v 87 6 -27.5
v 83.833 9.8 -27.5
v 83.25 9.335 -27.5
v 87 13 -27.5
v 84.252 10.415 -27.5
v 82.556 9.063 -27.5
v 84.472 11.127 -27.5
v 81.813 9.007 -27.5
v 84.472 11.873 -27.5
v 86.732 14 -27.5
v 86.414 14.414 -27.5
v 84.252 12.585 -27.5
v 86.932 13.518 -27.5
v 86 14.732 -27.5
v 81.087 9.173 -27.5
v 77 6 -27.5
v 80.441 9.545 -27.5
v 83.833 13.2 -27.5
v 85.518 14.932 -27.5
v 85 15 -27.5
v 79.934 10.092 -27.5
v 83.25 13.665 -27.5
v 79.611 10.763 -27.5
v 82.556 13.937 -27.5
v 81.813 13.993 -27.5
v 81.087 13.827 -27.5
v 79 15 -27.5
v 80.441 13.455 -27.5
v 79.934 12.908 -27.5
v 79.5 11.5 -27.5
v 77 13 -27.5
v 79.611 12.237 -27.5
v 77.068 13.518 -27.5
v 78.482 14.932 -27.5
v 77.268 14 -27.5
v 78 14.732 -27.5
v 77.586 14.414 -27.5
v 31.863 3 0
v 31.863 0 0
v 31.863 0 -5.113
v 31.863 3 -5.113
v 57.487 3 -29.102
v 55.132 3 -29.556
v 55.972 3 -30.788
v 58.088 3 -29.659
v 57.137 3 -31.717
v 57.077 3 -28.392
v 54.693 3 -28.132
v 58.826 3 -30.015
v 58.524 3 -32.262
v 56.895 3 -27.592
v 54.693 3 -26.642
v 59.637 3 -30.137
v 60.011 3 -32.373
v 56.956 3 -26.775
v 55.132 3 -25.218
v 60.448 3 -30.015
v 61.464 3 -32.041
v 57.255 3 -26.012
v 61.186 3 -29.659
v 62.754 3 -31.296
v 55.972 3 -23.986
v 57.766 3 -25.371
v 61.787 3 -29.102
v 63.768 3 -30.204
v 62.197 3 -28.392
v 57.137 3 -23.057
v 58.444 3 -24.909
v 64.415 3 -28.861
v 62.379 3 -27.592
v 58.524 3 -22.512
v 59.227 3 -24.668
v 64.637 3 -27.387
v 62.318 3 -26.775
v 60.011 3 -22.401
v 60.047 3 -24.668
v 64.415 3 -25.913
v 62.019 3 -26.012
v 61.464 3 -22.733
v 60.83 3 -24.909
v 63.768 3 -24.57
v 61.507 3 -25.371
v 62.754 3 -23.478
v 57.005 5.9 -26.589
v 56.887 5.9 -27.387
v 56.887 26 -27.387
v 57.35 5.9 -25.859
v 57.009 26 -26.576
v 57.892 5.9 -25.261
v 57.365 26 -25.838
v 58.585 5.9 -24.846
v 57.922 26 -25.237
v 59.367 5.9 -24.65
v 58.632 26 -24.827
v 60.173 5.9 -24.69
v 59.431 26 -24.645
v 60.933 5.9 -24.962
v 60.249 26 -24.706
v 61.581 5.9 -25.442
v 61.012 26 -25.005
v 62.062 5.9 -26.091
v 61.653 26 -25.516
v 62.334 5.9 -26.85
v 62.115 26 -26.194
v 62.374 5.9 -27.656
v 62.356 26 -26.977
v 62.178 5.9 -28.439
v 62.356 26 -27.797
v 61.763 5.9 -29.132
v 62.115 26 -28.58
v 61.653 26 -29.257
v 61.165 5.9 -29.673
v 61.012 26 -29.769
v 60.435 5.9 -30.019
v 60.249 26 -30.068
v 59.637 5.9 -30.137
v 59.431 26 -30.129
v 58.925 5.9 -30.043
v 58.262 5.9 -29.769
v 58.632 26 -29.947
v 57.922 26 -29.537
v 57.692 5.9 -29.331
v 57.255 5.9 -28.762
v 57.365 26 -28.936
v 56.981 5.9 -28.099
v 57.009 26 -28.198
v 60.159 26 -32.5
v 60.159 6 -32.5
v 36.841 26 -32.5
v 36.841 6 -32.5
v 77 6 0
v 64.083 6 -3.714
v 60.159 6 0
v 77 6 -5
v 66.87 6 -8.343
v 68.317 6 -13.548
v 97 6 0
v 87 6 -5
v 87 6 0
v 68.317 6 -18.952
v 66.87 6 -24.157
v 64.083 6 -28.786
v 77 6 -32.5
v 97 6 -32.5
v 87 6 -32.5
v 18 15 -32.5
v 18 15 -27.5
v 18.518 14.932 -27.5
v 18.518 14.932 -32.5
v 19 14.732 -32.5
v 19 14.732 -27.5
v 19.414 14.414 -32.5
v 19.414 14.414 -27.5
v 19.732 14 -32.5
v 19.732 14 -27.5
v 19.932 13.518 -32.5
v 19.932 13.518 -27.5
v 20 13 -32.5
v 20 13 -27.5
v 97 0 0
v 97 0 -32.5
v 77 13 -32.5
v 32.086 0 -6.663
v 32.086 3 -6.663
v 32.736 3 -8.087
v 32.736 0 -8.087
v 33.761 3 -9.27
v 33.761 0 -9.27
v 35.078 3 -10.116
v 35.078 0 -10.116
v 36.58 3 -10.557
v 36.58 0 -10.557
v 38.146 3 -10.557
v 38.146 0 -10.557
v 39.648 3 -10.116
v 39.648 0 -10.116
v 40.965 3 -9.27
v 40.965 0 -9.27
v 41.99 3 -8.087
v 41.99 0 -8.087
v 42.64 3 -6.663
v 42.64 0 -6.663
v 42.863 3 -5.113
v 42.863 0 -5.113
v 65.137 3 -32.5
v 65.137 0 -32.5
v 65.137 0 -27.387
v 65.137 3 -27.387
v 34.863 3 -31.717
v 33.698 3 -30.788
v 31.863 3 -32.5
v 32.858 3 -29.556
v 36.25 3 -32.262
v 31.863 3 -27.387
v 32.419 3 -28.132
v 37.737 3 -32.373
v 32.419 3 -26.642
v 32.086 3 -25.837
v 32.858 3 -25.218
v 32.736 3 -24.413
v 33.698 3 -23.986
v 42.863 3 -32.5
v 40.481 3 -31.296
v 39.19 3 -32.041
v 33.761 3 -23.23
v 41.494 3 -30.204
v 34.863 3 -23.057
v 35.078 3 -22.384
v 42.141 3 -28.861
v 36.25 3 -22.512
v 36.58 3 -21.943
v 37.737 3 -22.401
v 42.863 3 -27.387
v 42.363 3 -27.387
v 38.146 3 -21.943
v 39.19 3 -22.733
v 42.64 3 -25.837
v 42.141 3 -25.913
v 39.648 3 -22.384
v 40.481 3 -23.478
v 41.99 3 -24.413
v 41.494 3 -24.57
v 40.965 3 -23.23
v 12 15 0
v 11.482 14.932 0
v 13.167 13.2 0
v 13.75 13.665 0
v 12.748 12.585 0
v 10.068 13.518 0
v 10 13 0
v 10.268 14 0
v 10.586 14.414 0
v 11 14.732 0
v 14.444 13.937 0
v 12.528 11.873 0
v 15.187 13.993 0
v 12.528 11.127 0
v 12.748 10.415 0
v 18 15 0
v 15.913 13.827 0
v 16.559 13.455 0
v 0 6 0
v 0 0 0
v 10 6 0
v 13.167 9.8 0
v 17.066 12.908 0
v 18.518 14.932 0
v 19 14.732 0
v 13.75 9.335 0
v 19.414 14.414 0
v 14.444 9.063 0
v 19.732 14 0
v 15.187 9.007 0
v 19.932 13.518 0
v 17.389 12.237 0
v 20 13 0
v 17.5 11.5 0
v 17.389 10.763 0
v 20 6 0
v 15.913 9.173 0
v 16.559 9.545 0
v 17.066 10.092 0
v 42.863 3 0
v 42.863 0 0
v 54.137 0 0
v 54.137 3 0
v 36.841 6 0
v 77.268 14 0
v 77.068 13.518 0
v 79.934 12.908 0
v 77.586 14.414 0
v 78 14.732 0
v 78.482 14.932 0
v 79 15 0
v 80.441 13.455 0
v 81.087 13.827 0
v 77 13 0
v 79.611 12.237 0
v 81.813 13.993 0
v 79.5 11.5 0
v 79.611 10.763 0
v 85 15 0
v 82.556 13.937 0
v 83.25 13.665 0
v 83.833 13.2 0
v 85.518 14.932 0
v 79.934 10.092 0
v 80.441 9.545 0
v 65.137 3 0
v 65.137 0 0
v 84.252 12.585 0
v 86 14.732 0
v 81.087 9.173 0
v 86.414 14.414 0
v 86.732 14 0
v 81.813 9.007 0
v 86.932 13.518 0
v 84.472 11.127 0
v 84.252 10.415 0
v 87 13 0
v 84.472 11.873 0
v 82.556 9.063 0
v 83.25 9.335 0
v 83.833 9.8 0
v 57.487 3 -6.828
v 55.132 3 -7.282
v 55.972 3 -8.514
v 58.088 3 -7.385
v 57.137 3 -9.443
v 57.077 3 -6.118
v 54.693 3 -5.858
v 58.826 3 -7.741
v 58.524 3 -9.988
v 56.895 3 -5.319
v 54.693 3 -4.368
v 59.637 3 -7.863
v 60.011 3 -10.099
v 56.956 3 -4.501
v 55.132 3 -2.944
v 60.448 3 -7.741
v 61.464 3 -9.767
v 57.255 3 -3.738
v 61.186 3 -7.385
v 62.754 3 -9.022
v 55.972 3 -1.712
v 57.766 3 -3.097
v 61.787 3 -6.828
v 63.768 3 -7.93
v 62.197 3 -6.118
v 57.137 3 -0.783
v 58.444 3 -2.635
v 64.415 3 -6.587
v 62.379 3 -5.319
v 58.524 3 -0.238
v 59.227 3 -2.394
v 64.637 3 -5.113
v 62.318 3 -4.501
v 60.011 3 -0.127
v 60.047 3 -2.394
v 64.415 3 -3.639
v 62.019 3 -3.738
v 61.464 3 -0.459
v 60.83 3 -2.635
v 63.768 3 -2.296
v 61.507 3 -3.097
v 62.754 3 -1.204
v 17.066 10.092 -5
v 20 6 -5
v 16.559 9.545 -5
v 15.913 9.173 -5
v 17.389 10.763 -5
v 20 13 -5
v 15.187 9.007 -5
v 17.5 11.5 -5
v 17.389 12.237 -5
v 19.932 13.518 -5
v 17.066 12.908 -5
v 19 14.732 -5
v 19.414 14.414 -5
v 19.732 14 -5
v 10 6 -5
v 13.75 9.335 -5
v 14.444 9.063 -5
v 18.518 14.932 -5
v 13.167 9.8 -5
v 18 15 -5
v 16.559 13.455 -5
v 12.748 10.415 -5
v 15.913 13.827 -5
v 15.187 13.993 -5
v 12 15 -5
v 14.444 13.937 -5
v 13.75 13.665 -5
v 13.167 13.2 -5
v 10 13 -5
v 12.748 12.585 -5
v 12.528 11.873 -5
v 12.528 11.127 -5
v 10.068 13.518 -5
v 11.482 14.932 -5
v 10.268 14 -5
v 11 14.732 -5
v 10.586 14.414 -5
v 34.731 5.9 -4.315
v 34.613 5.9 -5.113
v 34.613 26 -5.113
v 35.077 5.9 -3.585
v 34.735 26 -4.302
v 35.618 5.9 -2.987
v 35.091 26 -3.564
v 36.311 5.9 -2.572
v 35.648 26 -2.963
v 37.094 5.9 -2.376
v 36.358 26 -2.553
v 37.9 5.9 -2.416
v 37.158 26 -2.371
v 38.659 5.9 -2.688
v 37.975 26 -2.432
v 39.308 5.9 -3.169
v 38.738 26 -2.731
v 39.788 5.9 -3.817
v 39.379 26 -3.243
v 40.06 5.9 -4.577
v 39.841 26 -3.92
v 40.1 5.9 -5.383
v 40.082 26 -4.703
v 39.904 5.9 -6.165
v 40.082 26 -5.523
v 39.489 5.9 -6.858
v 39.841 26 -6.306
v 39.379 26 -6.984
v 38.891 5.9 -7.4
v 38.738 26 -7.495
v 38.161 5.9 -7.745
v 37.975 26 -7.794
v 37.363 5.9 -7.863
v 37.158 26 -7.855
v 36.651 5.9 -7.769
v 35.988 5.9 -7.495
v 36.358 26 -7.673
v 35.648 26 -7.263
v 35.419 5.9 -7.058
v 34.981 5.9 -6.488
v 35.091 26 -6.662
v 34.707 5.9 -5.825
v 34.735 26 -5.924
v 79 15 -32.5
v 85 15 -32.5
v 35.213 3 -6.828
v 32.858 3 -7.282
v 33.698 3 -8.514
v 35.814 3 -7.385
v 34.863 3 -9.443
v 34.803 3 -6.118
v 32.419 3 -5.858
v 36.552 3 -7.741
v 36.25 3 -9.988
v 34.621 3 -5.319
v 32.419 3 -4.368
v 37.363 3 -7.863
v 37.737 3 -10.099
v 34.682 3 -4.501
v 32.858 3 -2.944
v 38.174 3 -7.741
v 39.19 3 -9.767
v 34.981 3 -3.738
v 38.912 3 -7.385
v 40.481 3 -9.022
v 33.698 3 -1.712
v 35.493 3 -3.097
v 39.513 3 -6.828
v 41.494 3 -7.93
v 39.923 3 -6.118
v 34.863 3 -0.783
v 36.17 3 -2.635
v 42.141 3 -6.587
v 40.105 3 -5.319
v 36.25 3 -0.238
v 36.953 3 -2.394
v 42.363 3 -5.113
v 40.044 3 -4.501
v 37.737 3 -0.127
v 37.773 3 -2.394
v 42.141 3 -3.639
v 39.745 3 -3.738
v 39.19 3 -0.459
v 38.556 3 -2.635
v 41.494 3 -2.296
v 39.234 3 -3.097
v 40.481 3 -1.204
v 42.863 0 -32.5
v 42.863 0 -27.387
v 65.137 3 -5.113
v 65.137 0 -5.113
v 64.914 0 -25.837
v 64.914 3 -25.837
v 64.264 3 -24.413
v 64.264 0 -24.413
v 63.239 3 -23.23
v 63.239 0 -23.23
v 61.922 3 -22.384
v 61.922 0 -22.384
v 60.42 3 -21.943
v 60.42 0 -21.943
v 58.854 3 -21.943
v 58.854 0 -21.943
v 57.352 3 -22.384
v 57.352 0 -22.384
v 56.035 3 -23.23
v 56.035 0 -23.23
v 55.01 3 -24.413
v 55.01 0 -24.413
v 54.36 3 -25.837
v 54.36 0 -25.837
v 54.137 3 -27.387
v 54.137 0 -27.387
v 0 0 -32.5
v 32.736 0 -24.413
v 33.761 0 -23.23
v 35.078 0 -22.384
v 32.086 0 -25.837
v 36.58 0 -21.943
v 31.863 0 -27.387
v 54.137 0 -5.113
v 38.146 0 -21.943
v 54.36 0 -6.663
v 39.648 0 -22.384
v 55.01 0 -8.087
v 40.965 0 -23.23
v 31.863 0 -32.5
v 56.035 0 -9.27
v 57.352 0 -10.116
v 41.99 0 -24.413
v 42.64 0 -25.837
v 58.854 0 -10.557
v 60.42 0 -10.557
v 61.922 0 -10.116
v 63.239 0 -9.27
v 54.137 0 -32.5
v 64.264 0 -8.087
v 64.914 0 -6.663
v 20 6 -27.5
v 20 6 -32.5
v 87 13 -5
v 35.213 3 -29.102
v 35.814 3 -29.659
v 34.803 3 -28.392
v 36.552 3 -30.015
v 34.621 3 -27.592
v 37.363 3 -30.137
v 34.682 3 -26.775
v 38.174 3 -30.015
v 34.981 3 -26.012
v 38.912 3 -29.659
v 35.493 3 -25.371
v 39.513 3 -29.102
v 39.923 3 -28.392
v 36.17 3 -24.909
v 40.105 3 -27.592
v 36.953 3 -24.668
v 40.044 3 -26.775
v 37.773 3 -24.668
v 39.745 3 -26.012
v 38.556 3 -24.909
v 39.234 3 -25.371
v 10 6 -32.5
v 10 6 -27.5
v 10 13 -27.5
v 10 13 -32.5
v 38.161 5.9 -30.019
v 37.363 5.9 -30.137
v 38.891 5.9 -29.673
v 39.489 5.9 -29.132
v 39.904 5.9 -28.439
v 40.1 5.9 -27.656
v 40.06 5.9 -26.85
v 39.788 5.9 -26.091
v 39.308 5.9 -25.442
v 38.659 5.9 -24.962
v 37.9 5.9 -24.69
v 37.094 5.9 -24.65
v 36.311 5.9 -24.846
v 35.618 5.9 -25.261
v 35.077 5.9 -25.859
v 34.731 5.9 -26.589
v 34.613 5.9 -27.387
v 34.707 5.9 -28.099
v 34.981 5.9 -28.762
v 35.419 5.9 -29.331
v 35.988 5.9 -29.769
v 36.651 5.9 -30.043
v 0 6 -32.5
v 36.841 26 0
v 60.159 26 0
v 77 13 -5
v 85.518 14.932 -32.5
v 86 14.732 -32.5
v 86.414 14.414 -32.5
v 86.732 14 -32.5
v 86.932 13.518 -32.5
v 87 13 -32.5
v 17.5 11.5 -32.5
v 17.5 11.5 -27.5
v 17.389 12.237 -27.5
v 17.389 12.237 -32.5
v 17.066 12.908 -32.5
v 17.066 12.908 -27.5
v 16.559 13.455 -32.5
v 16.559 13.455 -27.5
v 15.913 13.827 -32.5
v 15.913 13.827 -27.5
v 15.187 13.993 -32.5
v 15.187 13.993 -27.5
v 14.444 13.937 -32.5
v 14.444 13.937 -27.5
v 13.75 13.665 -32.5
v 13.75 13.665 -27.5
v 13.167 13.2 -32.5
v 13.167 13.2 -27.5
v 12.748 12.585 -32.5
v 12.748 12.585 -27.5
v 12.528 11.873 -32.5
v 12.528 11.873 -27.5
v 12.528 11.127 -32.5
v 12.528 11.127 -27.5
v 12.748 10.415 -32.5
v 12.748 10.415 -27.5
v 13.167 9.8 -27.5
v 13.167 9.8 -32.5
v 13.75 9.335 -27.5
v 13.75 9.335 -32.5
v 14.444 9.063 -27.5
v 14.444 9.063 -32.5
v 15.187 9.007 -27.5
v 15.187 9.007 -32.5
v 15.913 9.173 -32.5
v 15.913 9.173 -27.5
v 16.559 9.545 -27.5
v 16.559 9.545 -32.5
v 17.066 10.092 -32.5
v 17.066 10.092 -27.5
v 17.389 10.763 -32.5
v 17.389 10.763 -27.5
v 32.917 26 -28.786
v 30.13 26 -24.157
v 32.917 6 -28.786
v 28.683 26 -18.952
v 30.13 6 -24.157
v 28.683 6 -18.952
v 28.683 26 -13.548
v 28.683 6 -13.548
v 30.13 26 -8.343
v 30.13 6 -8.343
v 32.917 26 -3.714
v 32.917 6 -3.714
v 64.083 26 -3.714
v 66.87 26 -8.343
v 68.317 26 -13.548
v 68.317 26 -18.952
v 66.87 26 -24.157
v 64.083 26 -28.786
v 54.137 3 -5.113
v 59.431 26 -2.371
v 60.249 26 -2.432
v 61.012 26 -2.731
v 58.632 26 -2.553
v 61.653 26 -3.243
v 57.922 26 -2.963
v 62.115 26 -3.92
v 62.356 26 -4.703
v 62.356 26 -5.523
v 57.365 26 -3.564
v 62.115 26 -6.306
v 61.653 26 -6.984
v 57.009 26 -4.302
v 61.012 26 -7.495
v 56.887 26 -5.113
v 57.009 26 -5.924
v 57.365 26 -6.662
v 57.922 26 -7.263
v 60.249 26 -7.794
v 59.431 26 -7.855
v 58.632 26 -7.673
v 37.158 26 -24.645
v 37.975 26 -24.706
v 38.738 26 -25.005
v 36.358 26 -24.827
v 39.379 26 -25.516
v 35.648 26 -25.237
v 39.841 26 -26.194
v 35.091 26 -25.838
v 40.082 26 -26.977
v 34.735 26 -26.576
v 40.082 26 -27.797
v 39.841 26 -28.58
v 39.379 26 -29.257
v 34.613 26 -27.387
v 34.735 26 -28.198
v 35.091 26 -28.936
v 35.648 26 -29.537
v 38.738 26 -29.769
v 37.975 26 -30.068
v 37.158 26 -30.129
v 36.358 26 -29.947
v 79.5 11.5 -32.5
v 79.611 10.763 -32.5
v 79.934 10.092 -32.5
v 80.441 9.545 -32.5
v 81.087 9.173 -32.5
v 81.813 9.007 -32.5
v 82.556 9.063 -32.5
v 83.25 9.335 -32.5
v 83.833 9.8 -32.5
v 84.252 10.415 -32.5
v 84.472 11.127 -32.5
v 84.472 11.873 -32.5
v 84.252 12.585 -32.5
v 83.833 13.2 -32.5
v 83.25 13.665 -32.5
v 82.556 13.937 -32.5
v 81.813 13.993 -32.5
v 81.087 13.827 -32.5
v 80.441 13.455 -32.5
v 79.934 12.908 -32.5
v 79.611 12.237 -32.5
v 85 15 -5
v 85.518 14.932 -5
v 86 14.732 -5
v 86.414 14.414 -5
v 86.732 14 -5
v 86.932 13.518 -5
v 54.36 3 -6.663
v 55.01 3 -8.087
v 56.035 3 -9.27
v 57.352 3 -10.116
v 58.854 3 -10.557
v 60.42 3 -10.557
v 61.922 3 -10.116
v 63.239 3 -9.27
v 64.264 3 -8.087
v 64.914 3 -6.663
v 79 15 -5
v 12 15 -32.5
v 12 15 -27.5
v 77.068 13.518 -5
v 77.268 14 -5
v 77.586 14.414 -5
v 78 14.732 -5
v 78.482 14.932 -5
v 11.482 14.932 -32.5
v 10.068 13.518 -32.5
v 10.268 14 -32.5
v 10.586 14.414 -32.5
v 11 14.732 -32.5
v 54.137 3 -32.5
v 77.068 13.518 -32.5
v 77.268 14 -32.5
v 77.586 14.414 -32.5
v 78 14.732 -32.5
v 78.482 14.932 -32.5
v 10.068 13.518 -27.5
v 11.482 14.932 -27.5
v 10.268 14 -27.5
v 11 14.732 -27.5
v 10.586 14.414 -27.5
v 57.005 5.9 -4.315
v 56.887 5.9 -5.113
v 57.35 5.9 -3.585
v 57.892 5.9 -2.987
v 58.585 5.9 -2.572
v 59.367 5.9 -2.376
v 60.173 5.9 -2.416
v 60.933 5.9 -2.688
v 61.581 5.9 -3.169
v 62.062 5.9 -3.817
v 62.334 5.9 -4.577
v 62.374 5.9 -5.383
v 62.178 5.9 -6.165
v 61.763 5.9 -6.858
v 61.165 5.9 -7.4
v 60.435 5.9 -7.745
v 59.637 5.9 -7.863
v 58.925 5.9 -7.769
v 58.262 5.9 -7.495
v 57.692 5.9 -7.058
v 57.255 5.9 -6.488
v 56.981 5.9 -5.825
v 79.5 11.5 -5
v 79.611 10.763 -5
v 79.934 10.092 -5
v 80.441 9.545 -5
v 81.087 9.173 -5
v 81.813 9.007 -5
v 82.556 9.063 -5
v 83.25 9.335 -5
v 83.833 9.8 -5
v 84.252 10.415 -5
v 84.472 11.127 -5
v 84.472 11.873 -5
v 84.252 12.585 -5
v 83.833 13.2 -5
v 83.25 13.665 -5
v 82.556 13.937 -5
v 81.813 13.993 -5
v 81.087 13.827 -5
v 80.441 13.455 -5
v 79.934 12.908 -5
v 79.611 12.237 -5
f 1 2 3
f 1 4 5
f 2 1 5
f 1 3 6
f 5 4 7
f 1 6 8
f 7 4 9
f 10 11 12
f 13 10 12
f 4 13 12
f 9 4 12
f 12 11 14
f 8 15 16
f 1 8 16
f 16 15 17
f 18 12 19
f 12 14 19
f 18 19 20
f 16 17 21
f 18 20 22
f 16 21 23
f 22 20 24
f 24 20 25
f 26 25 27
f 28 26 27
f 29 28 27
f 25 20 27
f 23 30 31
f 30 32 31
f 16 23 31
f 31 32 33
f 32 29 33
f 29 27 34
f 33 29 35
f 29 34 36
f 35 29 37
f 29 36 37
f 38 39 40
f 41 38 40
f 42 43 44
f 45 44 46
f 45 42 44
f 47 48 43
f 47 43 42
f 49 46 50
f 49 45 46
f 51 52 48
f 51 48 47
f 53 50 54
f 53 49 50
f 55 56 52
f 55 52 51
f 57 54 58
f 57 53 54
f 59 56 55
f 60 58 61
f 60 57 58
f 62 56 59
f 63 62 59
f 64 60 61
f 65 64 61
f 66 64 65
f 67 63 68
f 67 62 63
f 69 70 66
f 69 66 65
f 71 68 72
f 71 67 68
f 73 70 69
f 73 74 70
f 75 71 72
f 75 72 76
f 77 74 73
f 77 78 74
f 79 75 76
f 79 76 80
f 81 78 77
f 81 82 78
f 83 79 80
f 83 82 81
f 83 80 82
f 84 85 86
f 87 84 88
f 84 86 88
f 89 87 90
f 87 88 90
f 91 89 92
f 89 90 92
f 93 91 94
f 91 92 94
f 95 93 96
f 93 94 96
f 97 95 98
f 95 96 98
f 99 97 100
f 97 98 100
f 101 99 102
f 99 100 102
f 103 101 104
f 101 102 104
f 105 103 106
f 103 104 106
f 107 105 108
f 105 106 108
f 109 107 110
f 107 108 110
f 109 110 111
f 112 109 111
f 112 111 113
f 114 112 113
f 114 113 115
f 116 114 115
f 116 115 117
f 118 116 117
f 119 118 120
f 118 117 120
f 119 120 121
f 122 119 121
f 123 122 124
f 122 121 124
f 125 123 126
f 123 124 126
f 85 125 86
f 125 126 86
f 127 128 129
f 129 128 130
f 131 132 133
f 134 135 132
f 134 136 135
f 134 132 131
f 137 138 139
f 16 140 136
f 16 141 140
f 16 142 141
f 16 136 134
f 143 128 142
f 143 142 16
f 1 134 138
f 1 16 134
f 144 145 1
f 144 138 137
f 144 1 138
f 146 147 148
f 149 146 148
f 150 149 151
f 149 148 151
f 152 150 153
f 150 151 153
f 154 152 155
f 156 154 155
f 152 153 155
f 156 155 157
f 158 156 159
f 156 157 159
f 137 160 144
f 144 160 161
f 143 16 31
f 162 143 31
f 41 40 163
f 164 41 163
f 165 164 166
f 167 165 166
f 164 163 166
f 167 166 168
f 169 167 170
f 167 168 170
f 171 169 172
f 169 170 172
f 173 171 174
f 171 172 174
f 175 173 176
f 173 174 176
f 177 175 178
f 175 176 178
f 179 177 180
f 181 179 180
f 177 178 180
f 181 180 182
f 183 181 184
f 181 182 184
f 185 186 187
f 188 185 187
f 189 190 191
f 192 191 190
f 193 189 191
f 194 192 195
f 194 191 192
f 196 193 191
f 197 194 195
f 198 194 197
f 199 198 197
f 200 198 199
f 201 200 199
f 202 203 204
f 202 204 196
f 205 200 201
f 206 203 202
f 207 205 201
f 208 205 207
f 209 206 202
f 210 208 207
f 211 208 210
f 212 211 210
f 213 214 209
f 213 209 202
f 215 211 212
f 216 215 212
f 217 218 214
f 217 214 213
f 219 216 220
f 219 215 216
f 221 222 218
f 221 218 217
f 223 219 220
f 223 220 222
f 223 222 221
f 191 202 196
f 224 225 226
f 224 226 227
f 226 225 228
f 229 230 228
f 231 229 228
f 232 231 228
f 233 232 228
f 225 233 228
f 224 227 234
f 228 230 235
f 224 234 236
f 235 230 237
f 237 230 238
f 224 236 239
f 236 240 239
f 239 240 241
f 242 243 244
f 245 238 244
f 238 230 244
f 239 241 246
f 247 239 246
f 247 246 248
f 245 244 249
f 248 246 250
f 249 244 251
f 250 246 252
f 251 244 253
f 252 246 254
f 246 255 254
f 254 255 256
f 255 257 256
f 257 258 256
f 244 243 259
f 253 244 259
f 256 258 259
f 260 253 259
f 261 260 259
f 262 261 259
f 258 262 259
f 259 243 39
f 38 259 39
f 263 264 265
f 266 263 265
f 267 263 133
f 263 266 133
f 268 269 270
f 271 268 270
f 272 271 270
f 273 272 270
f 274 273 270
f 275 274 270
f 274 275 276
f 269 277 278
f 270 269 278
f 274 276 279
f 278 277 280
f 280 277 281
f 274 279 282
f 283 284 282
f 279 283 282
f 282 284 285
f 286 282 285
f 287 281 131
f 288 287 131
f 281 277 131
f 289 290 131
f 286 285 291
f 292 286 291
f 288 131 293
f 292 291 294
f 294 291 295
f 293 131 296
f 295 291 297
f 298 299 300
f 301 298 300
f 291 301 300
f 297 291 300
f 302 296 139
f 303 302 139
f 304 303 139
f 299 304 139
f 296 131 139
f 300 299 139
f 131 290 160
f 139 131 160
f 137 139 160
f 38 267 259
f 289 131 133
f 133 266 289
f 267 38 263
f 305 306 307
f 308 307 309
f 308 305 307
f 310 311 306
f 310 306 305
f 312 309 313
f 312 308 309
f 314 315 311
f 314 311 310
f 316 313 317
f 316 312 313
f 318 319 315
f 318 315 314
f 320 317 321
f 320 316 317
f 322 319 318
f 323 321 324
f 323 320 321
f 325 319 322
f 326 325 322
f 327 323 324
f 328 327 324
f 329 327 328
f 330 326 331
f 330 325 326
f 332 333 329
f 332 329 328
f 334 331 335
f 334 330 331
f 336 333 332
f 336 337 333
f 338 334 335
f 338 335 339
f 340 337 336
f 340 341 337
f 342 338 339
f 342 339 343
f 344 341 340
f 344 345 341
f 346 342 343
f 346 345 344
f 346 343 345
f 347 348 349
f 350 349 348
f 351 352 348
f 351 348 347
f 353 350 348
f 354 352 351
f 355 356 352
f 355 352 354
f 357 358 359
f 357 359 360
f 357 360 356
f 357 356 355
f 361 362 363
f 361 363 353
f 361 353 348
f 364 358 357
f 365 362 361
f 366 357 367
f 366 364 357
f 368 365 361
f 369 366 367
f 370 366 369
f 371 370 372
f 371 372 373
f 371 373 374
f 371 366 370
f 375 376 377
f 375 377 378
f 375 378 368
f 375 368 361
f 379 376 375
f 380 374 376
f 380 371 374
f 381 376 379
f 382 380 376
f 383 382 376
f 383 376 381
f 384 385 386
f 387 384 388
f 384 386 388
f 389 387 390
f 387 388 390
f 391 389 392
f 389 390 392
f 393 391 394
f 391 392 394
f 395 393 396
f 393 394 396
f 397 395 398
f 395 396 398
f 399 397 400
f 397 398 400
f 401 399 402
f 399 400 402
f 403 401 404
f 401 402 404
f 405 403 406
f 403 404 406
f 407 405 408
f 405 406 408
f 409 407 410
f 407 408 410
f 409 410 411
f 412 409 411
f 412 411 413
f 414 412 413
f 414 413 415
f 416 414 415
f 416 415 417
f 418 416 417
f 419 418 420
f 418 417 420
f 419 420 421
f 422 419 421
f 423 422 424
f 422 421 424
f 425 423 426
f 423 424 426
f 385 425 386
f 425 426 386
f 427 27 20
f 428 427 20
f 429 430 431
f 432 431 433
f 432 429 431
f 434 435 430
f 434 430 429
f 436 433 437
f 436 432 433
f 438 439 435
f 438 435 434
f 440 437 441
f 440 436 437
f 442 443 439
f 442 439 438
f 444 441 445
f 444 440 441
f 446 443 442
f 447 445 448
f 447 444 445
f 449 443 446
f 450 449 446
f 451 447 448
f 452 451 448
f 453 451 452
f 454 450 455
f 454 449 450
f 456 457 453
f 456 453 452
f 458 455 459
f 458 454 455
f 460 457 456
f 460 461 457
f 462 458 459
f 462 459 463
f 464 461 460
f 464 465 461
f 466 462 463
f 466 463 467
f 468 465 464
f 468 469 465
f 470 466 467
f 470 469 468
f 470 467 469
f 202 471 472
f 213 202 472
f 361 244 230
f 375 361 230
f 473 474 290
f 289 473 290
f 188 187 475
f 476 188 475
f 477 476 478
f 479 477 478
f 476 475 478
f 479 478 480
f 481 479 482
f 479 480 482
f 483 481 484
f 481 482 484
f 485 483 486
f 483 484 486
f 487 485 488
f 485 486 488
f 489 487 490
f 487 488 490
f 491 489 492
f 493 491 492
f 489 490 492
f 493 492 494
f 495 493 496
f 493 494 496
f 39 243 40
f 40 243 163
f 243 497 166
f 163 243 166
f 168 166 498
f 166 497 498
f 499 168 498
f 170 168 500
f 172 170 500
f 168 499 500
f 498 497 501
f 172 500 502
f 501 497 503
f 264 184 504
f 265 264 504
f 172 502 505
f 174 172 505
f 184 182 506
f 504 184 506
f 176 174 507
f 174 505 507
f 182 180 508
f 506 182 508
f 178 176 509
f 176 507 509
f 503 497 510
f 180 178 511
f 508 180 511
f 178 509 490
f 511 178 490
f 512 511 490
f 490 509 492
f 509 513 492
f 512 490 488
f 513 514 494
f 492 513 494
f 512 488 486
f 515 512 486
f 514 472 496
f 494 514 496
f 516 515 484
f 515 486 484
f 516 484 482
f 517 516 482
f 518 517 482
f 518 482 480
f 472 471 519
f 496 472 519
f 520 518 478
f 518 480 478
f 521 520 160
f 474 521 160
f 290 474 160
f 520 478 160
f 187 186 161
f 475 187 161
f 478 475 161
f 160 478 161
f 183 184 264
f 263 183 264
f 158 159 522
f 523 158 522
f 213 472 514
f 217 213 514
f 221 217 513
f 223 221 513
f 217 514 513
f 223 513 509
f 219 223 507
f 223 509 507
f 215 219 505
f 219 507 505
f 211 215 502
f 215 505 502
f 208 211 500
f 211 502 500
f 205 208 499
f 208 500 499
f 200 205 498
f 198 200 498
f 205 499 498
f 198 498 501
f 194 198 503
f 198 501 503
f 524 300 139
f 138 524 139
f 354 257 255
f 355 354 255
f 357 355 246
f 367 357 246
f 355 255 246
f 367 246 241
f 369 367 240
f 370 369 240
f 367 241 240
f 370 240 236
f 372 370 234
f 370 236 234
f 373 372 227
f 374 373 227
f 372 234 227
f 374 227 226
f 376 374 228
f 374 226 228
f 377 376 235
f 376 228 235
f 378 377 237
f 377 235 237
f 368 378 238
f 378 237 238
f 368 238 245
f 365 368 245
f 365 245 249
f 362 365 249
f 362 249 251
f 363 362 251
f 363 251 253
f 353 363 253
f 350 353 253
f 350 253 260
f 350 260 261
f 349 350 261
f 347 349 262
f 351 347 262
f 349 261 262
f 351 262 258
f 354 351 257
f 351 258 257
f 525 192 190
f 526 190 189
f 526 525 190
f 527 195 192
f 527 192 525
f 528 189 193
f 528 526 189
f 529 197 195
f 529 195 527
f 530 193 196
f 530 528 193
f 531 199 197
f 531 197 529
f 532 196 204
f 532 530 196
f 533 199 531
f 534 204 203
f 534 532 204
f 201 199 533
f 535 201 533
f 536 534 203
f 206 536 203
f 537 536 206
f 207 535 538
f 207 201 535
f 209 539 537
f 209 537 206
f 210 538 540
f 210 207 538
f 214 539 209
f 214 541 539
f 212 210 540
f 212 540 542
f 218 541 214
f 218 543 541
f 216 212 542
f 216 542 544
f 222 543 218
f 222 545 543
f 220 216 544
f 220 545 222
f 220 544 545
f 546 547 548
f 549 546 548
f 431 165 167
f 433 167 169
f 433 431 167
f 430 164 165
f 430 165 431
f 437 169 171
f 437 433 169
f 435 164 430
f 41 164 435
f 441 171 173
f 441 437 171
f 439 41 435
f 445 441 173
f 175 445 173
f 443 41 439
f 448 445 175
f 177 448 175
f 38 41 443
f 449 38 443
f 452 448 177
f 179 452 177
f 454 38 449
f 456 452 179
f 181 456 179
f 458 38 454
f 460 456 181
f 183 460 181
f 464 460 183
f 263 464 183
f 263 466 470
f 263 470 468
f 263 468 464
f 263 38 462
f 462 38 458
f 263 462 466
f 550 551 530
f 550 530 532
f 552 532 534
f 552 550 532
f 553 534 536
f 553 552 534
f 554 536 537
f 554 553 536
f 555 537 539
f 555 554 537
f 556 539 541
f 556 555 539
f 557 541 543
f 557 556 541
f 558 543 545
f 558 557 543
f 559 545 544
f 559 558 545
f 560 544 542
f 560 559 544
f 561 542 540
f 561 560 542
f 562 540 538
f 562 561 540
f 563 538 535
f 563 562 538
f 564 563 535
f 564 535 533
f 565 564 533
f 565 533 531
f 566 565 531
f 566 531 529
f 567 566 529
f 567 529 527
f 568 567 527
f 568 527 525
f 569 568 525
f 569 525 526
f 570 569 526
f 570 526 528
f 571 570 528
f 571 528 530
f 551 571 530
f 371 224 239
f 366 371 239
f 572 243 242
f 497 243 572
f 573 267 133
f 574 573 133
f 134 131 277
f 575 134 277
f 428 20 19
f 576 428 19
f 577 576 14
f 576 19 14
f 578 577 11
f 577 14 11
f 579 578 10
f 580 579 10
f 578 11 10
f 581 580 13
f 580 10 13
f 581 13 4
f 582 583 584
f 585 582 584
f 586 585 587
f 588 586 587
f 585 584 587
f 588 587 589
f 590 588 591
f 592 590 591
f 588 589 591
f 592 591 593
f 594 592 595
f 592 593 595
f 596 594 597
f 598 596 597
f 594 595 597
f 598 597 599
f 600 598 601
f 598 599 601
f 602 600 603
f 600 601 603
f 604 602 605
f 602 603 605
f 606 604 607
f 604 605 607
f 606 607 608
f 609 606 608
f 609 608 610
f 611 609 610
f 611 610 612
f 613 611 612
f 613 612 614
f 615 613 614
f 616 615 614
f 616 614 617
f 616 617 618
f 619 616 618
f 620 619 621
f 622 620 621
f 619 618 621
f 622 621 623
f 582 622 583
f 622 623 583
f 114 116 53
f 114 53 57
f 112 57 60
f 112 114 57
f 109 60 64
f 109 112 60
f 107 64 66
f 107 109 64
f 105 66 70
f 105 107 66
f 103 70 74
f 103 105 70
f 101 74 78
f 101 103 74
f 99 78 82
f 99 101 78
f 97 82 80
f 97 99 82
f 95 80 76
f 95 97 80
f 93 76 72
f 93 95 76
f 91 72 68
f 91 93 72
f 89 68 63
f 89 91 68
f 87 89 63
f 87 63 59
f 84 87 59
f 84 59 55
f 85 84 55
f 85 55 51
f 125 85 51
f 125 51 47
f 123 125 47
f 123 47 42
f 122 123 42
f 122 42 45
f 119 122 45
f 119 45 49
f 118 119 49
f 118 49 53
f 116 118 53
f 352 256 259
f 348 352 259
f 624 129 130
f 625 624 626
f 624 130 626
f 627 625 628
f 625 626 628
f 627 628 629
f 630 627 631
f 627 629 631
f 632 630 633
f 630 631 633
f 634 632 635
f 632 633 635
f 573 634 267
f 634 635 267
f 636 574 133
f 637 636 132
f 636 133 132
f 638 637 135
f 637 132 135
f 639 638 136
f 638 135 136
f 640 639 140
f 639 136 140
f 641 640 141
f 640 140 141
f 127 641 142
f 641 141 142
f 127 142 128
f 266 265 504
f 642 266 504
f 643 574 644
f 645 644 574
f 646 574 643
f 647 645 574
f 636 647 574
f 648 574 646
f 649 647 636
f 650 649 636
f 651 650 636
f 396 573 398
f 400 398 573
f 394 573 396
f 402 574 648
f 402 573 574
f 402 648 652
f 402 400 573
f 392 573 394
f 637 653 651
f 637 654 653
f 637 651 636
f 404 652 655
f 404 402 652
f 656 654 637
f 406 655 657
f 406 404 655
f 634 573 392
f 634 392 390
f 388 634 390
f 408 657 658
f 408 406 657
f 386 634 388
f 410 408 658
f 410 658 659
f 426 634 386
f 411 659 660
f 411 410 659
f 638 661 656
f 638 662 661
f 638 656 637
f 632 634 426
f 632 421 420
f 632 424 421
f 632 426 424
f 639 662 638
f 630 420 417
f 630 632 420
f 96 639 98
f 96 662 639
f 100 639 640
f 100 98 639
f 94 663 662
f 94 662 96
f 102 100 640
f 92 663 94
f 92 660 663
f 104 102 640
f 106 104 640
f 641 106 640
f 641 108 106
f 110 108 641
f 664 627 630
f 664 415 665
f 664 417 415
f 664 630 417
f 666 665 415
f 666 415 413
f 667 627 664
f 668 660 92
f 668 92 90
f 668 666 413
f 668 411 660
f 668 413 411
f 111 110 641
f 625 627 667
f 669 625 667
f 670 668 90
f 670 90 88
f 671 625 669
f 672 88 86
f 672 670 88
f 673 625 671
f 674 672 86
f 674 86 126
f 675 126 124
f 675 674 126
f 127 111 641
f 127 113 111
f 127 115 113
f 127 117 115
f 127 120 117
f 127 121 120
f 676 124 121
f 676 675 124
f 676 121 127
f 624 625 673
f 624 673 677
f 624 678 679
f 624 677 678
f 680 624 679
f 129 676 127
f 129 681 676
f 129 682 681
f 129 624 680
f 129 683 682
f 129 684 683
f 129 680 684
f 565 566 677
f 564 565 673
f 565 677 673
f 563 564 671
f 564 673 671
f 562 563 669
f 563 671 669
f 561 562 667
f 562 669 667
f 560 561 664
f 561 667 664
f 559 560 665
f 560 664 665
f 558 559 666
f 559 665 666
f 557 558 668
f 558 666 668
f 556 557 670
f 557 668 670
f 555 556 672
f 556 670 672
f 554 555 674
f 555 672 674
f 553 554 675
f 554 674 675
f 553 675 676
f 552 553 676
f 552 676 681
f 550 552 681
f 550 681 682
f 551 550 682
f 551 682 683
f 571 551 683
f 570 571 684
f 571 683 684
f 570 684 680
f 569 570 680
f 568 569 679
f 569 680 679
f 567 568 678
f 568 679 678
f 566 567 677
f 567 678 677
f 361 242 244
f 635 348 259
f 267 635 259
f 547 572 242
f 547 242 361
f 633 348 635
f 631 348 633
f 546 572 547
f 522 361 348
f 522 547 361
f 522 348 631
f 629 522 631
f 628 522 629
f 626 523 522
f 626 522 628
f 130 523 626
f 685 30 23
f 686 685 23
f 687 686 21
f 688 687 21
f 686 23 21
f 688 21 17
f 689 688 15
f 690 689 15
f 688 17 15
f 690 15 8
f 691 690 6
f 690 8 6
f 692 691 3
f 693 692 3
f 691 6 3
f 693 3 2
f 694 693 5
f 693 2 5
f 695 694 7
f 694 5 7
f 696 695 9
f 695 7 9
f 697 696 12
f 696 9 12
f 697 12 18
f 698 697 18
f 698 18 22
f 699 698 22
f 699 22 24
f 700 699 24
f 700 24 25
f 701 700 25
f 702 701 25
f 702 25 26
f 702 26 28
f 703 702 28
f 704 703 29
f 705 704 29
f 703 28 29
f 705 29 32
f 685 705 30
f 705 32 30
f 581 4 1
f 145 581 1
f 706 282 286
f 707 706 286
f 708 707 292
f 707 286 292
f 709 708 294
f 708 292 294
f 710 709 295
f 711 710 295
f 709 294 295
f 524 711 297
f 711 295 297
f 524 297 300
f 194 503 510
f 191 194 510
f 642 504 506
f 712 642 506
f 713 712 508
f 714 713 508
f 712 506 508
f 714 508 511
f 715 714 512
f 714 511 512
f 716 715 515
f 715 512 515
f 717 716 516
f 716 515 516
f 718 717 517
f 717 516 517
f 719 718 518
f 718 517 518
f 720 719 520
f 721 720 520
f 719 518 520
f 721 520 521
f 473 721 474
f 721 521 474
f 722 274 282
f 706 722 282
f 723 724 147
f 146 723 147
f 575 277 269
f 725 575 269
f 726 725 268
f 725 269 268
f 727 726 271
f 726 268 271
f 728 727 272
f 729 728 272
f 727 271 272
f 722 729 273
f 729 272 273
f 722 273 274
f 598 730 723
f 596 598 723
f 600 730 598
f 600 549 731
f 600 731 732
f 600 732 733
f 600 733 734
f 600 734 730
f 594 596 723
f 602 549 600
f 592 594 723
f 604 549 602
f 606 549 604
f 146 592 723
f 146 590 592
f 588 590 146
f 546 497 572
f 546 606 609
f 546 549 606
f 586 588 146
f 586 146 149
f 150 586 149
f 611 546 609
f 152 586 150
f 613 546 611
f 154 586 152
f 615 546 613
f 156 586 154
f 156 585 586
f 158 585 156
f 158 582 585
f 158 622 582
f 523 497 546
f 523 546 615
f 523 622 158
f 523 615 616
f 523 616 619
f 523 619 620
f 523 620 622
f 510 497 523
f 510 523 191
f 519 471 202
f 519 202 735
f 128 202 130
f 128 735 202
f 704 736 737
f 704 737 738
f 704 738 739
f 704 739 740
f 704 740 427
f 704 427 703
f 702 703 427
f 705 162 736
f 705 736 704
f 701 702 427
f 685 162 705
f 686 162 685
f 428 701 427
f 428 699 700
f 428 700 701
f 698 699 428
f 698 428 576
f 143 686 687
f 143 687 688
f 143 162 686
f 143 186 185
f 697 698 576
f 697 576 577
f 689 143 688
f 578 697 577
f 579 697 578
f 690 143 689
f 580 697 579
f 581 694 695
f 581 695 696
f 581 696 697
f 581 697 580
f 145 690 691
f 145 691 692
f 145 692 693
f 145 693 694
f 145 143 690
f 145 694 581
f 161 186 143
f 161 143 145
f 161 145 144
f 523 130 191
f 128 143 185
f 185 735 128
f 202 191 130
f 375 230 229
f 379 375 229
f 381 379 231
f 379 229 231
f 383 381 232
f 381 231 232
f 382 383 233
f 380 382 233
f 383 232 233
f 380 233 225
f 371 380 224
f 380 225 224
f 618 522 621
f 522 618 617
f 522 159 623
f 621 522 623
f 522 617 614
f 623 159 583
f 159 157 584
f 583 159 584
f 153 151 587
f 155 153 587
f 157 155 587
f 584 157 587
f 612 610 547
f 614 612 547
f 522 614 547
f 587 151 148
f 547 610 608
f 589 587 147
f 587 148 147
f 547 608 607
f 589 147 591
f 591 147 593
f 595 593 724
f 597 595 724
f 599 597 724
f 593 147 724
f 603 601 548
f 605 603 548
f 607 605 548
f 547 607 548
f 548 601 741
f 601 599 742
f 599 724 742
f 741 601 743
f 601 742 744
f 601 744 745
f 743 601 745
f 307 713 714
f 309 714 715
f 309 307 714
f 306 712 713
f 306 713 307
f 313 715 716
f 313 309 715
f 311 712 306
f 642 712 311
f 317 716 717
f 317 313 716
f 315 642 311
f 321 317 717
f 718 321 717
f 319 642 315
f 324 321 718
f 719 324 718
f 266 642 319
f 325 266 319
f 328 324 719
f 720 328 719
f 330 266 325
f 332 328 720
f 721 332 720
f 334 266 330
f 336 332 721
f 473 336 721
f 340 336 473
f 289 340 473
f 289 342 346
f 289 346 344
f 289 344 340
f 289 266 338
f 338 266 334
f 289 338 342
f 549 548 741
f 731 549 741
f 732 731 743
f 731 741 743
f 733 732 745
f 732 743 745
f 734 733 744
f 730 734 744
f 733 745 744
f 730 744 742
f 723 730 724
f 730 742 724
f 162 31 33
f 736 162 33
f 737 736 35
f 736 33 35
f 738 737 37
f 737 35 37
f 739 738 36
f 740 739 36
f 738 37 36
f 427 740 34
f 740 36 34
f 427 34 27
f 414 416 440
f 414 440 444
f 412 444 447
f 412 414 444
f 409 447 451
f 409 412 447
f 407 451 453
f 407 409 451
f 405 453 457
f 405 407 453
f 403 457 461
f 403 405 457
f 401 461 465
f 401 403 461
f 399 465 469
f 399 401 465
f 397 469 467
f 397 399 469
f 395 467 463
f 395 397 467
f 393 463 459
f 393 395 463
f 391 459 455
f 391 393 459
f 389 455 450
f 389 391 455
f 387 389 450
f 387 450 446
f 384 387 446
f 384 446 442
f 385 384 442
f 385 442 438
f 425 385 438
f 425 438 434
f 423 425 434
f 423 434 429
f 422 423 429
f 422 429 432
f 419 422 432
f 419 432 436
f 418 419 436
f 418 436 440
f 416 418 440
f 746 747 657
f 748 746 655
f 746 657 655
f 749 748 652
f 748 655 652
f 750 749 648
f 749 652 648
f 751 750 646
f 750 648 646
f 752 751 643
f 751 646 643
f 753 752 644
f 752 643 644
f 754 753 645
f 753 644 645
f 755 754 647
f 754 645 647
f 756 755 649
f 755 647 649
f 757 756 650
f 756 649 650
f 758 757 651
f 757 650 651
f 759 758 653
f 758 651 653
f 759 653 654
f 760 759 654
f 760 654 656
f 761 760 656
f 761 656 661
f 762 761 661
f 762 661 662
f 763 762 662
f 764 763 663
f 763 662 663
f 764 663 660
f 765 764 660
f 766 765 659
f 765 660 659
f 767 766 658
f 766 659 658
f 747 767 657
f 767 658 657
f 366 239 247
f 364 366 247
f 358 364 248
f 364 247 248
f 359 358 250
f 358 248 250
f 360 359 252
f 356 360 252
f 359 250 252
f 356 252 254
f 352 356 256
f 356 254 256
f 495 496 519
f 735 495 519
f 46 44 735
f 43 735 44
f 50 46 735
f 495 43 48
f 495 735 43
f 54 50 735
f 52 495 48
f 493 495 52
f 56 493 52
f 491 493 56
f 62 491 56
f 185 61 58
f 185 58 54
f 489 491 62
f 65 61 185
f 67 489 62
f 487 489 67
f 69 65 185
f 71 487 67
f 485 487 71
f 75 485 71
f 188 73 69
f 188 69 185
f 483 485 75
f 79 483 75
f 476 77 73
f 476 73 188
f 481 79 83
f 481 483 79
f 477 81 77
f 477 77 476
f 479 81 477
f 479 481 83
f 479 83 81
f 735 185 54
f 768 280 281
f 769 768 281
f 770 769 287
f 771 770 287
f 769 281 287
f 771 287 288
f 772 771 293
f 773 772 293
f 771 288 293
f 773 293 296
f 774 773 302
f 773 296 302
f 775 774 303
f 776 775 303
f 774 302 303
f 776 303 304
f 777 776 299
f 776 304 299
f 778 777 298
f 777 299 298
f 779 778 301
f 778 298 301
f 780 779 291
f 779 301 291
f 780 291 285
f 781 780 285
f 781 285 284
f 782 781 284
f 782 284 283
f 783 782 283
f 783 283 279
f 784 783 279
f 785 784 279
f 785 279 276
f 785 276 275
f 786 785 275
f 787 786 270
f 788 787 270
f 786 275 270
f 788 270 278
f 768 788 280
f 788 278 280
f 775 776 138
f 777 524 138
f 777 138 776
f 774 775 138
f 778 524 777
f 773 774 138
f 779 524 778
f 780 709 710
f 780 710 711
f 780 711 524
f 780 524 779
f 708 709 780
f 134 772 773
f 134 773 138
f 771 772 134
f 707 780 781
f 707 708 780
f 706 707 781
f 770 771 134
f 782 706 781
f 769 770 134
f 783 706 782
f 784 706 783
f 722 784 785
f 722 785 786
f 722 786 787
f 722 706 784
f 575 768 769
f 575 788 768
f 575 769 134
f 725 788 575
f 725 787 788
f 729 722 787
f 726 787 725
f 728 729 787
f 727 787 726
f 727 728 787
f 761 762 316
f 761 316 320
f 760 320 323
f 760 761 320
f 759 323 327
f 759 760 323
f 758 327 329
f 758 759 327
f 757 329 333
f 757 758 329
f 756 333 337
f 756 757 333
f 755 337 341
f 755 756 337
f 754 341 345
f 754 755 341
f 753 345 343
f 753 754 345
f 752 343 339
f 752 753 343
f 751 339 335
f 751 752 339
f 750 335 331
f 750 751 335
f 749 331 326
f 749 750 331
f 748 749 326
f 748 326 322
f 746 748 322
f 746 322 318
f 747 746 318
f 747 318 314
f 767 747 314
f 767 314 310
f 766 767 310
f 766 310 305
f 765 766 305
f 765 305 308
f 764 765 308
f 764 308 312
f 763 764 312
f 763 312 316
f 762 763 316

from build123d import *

# Parameters (mm, degrees)
SKETCH1_W                                           = 97
SKETCH1_H                                           = 32.5
BOSS_EXTRUDE1_DEPTH                                 = 6
SKETCH5_R                                           = 20
BOSS_EXTRUDE5_DEPTH                                 = 20
CBORE_FOR_M5_HEX_SOCKET_HEAD_CAP_SCREW1_D           = 5.5
CBORE_FOR_M5_HEX_SOCKET_HEAD_CAP_SCREW1_CBORE_D     = 10
CBORE_FOR_M5_HEX_SOCKET_HEAD_CAP_SCREW1_CBORE_DEPTH = 5.9
SKETCH16_R                                          = 2.5
BOSS_EXTRUDE6_DEPTH                                 = 5
BOSS_EXTRUDE7_START                                 = -27.5
SKETCH16_2_R                                        = 2.5
BOSS_EXTRUDE7_DEPTH                                 = 5
SKETCH17_R                                          = 5
CUT_EXTRUDE3_DEPTH                                  = 3
SKETCH18_R                                          = 5
SKETCH18_R_2                                        = 2.75
BOSS_EXTRUDE8_DEPTH                                 = 2.9
CUT_EXTRUDE4_DEPTH                                  = 20


with BuildPart() as part:
    # Sketch1 → Boss-Extrude1 (new body)
    with BuildSketch(Plane(origin=(0, 0, 0), x_dir=(1, 0, 0), z_dir=(0, 1, 0))):
        with Locations((48.5, 16.25)):
            Rectangle(SKETCH1_W, SKETCH1_H)
    extrude(amount=BOSS_EXTRUDE1_DEPTH)

    # Sketch5 → Boss-Extrude5 (add)
    with BuildSketch(Plane(origin=(0, 6, 0), x_dir=(1, 0, 0), z_dir=(0, 1, 0))):
        with Locations(Location((48.5, 16.25, 0), (0, 0, 54.340912304))):
            Circle(SKETCH5_R)
    extrude(amount=BOSS_EXTRUDE5_DEPTH)

    # CBORE for M5 Hex Socket Head Cap Screw1 (through all)
    with Locations(Plane.XZ):
        with Locations((37.363068196, -5.113068196), (59.636931804, -5.113068196), (59.636931804, -27.386931804), (37.363068196, -27.386931804)):
            CounterBoreHole(CBORE_FOR_M5_HEX_SOCKET_HEAD_CAP_SCREW1_D / 2, CBORE_FOR_M5_HEX_SOCKET_HEAD_CAP_SCREW1_CBORE_D / 2, CBORE_FOR_M5_HEX_SOCKET_HEAD_CAP_SCREW1_CBORE_DEPTH)

    # Sketch16 → Boss-Extrude6 (add)
    # profile 1 of 2: a face of its own
    with BuildSketch(Plane.XY):
        with BuildLine():
            Line((87, 6), (77, 6))
            Line((77, 6), (77, 13))
            ThreePointArc((77, 13), (77.585786438, 14.414213562), (79, 15))
            Line((79, 15), (85, 15))
            ThreePointArc((85, 15), (86.414213562, 14.414213562), (87, 13))
            Line((87, 13), (87, 6))
        make_face()
        with Locations(Location((82, 11.5, 0), (0, 0, 180))):
            Circle(SKETCH16_R, mode=Mode.SUBTRACT)
    # profile 2 of 2: a face of its own
    with BuildSketch(Plane.XY):
        with BuildLine():
            Line((10, 6), (10, 13))
            ThreePointArc((10, 13), (10.585786438, 14.414213562), (12, 15))
            Line((12, 15), (18, 15))
            ThreePointArc((18, 15), (19.414213562, 14.414213562), (20, 13))
            Line((20, 13), (20, 6))
            Line((20, 6), (10, 6))
        make_face()
        with Locations((15, 11.5)):
            Circle(SKETCH16_R, mode=Mode.SUBTRACT)
    extrude(amount=-BOSS_EXTRUDE6_DEPTH)

    # Sketch16<2> → Boss-Extrude7 (add)
    # profile 1 of 2: a face of its own
    with BuildSketch(Plane.XY.offset(BOSS_EXTRUDE7_START)):
        with BuildLine():
            Line((87, 6), (77, 6))
            Line((77, 6), (77, 13))
            ThreePointArc((77, 13), (77.585786438, 14.414213562), (79, 15))
            Line((79, 15), (85, 15))
            ThreePointArc((85, 15), (86.414213562, 14.414213562), (87, 13))
            Line((87, 13), (87, 6))
        make_face()
        with Locations(Location((82, 11.5, 0), (0, 0, 180))):
            Circle(SKETCH16_2_R, mode=Mode.SUBTRACT)
    # profile 2 of 2: a face of its own
    with BuildSketch(Plane.XY.offset(BOSS_EXTRUDE7_START)):
        with BuildLine():
            Line((10, 6), (10, 13))
            ThreePointArc((10, 13), (10.585786438, 14.414213562), (12, 15))
            Line((12, 15), (18, 15))
            ThreePointArc((18, 15), (19.414213562, 14.414213562), (20, 13))
            Line((20, 13), (20, 6))
            Line((20, 6), (10, 6))
        make_face()
        with Locations((15, 11.5)):
            Circle(SKETCH16_2_R, mode=Mode.SUBTRACT)
    extrude(amount=-BOSS_EXTRUDE7_DEPTH)

    # Sketch17 → Cut-Extrude3 (cut)
    # profile 1 of 8: a face of its own
    with BuildSketch(Plane.XZ):
        with BuildLine():
            ThreePointArc((42.863068196, -27.386931804), (37.363068196, -21.886931804), (31.863068196, -27.386931804))
            Line((31.863068196, -27.386931804), (31.863068196, -32.5))
            Line((31.863068196, -32.5), (42.863068196, -32.5))
            Line((42.863068196, -32.5), (42.863068196, -27.386931804))
        make_face()
        with Locations(Location((37.363068196, -27.386931804, 0), (0, 0, 270))):
            Circle(SKETCH17_R, mode=Mode.SUBTRACT)
    # profile 2 of 8: a face of its own
    with BuildSketch(Plane.XZ):
        with BuildLine():
            Line((54.136931804, -27.386931804), (54.136931804, -32.5))
            Line((54.136931804, -32.5), (65.136931804, -32.5))
            Line((65.136931804, -32.5), (65.136931804, -27.386931804))
            ThreePointArc((65.136931804, -27.386931804), (59.636931804, -21.886931804), (54.136931804, -27.386931804))
        make_face()
        with Locations(Location((59.636931804, -27.386931804, 0), (0, 0, 270))):
            Circle(SKETCH17_R, mode=Mode.SUBTRACT)
    # profile 3 of 8: a face of its own
    with BuildSketch(Plane.XZ):
        with BuildLine():
            Line((54.136931804, 0), (54.136931804, -5.113068196))
            ThreePointArc((54.136931804, -5.113068196), (59.636931804, -10.613068196), (65.136931804, -5.113068196))
            Line((65.136931804, -5.113068196), (65.136931804, 0))
            Line((65.136931804, 0), (54.136931804, 0))
        make_face()
        with Locations(Location((59.636931804, -5.113068196, 0), (0, 0, 270))):
            Circle(SKETCH17_R, mode=Mode.SUBTRACT)
    # profile 4 of 8: a face of its own
    with BuildSketch(Plane.XZ):
        with BuildLine():
            Line((42.863068196, -5.113068196), (42.863068196, 0))
            Line((42.863068196, 0), (31.863068196, 0))
            Line((31.863068196, 0), (31.863068196, -5.113068196))
            ThreePointArc((31.863068196, -5.113068196), (37.363068196, -10.613068196), (42.863068196, -5.113068196))
        make_face()
        with Locations(Location((37.363068196, -5.113068196, 0), (0, 0, 270))):
            Circle(SKETCH17_R, mode=Mode.SUBTRACT)
    # profile 5 of 8: a face of its own
    with BuildSketch(Plane.XZ):
        with Locations(Location((37.363068196, -27.386931804, 0), (0, 0, 270))):
            Circle(SKETCH17_R)
    # profile 6 of 8: a face of its own
    with BuildSketch(Plane.XZ):
        with Locations(Location((59.636931804, -27.386931804, 0), (0, 0, 270))):
            Circle(SKETCH17_R)
    # profile 7 of 8: a face of its own
    with BuildSketch(Plane.XZ):
        with Locations(Location((59.636931804, -5.113068196, 0), (0, 0, 270))):
            Circle(SKETCH17_R)
    # profile 8 of 8: a face of its own
    with BuildSketch(Plane.XZ):
        with Locations(Location((37.363068196, -5.113068196, 0), (0, 0, 270))):
            Circle(SKETCH17_R)
    extrude(amount=-CUT_EXTRUDE3_DEPTH, mode=Mode.SUBTRACT)

    # Sketch18 → Boss-Extrude8 (add)
    # profile 1 of 4: a face of its own
    with BuildSketch(Plane.XZ.offset(-5.9)):
        with Locations((37.363068196, -27.386931804)):
            Circle(SKETCH18_R)
        with Locations(Location((37.363068196, -27.386931804, 0), (0, 0, 270))):
            Circle(SKETCH18_R_2, mode=Mode.SUBTRACT)
    # profile 2 of 4: a face of its own
    with BuildSketch(Plane.XZ.offset(-5.9)):
        with Locations((37.363068196, -5.113068196)):
            Circle(SKETCH18_R)
        with Locations(Location((37.363068196, -5.113068196, 0), (0, 0, 270))):
            Circle(SKETCH18_R_2, mode=Mode.SUBTRACT)
    # profile 3 of 4: a face of its own
    with BuildSketch(Plane.XZ.offset(-5.9)):
        with Locations((59.636931804, -5.113068196)):
            Circle(SKETCH18_R)
        with Locations(Location((59.636931804, -5.113068196, 0), (0, 0, 270))):
            Circle(SKETCH18_R_2, mode=Mode.SUBTRACT)
    # profile 4 of 4: a face of its own
    with BuildSketch(Plane.XZ.offset(-5.9)):
        with Locations((59.636931804, -27.386931804)):
            Circle(SKETCH18_R)
        with Locations(Location((59.636931804, -27.386931804, 0), (0, 0, 270))):
            Circle(SKETCH18_R_2, mode=Mode.SUBTRACT)
    extrude(amount=BOSS_EXTRUDE8_DEPTH)

    # Sketch19 → Cut-Extrude4 (cut)
    with BuildSketch(Plane.XZ.offset(-6)):
        with BuildLine():
            Line((36.840776184, 0), (60.159223816, 0))
            ThreePointArc((60.159223816, 0), (48.5, 3.75), (36.840776184, 0))
        make_face()
        with BuildLine():
            Line((60.159223816, -32.5), (36.840776184, -32.5))
            ThreePointArc((36.840776184, -32.5), (48.5, -36.25), (60.159223816, -32.5))
        make_face()
    extrude(amount=-CUT_EXTRUDE4_DEPTH, mode=Mode.SUBTRACT)


solid = part.part
